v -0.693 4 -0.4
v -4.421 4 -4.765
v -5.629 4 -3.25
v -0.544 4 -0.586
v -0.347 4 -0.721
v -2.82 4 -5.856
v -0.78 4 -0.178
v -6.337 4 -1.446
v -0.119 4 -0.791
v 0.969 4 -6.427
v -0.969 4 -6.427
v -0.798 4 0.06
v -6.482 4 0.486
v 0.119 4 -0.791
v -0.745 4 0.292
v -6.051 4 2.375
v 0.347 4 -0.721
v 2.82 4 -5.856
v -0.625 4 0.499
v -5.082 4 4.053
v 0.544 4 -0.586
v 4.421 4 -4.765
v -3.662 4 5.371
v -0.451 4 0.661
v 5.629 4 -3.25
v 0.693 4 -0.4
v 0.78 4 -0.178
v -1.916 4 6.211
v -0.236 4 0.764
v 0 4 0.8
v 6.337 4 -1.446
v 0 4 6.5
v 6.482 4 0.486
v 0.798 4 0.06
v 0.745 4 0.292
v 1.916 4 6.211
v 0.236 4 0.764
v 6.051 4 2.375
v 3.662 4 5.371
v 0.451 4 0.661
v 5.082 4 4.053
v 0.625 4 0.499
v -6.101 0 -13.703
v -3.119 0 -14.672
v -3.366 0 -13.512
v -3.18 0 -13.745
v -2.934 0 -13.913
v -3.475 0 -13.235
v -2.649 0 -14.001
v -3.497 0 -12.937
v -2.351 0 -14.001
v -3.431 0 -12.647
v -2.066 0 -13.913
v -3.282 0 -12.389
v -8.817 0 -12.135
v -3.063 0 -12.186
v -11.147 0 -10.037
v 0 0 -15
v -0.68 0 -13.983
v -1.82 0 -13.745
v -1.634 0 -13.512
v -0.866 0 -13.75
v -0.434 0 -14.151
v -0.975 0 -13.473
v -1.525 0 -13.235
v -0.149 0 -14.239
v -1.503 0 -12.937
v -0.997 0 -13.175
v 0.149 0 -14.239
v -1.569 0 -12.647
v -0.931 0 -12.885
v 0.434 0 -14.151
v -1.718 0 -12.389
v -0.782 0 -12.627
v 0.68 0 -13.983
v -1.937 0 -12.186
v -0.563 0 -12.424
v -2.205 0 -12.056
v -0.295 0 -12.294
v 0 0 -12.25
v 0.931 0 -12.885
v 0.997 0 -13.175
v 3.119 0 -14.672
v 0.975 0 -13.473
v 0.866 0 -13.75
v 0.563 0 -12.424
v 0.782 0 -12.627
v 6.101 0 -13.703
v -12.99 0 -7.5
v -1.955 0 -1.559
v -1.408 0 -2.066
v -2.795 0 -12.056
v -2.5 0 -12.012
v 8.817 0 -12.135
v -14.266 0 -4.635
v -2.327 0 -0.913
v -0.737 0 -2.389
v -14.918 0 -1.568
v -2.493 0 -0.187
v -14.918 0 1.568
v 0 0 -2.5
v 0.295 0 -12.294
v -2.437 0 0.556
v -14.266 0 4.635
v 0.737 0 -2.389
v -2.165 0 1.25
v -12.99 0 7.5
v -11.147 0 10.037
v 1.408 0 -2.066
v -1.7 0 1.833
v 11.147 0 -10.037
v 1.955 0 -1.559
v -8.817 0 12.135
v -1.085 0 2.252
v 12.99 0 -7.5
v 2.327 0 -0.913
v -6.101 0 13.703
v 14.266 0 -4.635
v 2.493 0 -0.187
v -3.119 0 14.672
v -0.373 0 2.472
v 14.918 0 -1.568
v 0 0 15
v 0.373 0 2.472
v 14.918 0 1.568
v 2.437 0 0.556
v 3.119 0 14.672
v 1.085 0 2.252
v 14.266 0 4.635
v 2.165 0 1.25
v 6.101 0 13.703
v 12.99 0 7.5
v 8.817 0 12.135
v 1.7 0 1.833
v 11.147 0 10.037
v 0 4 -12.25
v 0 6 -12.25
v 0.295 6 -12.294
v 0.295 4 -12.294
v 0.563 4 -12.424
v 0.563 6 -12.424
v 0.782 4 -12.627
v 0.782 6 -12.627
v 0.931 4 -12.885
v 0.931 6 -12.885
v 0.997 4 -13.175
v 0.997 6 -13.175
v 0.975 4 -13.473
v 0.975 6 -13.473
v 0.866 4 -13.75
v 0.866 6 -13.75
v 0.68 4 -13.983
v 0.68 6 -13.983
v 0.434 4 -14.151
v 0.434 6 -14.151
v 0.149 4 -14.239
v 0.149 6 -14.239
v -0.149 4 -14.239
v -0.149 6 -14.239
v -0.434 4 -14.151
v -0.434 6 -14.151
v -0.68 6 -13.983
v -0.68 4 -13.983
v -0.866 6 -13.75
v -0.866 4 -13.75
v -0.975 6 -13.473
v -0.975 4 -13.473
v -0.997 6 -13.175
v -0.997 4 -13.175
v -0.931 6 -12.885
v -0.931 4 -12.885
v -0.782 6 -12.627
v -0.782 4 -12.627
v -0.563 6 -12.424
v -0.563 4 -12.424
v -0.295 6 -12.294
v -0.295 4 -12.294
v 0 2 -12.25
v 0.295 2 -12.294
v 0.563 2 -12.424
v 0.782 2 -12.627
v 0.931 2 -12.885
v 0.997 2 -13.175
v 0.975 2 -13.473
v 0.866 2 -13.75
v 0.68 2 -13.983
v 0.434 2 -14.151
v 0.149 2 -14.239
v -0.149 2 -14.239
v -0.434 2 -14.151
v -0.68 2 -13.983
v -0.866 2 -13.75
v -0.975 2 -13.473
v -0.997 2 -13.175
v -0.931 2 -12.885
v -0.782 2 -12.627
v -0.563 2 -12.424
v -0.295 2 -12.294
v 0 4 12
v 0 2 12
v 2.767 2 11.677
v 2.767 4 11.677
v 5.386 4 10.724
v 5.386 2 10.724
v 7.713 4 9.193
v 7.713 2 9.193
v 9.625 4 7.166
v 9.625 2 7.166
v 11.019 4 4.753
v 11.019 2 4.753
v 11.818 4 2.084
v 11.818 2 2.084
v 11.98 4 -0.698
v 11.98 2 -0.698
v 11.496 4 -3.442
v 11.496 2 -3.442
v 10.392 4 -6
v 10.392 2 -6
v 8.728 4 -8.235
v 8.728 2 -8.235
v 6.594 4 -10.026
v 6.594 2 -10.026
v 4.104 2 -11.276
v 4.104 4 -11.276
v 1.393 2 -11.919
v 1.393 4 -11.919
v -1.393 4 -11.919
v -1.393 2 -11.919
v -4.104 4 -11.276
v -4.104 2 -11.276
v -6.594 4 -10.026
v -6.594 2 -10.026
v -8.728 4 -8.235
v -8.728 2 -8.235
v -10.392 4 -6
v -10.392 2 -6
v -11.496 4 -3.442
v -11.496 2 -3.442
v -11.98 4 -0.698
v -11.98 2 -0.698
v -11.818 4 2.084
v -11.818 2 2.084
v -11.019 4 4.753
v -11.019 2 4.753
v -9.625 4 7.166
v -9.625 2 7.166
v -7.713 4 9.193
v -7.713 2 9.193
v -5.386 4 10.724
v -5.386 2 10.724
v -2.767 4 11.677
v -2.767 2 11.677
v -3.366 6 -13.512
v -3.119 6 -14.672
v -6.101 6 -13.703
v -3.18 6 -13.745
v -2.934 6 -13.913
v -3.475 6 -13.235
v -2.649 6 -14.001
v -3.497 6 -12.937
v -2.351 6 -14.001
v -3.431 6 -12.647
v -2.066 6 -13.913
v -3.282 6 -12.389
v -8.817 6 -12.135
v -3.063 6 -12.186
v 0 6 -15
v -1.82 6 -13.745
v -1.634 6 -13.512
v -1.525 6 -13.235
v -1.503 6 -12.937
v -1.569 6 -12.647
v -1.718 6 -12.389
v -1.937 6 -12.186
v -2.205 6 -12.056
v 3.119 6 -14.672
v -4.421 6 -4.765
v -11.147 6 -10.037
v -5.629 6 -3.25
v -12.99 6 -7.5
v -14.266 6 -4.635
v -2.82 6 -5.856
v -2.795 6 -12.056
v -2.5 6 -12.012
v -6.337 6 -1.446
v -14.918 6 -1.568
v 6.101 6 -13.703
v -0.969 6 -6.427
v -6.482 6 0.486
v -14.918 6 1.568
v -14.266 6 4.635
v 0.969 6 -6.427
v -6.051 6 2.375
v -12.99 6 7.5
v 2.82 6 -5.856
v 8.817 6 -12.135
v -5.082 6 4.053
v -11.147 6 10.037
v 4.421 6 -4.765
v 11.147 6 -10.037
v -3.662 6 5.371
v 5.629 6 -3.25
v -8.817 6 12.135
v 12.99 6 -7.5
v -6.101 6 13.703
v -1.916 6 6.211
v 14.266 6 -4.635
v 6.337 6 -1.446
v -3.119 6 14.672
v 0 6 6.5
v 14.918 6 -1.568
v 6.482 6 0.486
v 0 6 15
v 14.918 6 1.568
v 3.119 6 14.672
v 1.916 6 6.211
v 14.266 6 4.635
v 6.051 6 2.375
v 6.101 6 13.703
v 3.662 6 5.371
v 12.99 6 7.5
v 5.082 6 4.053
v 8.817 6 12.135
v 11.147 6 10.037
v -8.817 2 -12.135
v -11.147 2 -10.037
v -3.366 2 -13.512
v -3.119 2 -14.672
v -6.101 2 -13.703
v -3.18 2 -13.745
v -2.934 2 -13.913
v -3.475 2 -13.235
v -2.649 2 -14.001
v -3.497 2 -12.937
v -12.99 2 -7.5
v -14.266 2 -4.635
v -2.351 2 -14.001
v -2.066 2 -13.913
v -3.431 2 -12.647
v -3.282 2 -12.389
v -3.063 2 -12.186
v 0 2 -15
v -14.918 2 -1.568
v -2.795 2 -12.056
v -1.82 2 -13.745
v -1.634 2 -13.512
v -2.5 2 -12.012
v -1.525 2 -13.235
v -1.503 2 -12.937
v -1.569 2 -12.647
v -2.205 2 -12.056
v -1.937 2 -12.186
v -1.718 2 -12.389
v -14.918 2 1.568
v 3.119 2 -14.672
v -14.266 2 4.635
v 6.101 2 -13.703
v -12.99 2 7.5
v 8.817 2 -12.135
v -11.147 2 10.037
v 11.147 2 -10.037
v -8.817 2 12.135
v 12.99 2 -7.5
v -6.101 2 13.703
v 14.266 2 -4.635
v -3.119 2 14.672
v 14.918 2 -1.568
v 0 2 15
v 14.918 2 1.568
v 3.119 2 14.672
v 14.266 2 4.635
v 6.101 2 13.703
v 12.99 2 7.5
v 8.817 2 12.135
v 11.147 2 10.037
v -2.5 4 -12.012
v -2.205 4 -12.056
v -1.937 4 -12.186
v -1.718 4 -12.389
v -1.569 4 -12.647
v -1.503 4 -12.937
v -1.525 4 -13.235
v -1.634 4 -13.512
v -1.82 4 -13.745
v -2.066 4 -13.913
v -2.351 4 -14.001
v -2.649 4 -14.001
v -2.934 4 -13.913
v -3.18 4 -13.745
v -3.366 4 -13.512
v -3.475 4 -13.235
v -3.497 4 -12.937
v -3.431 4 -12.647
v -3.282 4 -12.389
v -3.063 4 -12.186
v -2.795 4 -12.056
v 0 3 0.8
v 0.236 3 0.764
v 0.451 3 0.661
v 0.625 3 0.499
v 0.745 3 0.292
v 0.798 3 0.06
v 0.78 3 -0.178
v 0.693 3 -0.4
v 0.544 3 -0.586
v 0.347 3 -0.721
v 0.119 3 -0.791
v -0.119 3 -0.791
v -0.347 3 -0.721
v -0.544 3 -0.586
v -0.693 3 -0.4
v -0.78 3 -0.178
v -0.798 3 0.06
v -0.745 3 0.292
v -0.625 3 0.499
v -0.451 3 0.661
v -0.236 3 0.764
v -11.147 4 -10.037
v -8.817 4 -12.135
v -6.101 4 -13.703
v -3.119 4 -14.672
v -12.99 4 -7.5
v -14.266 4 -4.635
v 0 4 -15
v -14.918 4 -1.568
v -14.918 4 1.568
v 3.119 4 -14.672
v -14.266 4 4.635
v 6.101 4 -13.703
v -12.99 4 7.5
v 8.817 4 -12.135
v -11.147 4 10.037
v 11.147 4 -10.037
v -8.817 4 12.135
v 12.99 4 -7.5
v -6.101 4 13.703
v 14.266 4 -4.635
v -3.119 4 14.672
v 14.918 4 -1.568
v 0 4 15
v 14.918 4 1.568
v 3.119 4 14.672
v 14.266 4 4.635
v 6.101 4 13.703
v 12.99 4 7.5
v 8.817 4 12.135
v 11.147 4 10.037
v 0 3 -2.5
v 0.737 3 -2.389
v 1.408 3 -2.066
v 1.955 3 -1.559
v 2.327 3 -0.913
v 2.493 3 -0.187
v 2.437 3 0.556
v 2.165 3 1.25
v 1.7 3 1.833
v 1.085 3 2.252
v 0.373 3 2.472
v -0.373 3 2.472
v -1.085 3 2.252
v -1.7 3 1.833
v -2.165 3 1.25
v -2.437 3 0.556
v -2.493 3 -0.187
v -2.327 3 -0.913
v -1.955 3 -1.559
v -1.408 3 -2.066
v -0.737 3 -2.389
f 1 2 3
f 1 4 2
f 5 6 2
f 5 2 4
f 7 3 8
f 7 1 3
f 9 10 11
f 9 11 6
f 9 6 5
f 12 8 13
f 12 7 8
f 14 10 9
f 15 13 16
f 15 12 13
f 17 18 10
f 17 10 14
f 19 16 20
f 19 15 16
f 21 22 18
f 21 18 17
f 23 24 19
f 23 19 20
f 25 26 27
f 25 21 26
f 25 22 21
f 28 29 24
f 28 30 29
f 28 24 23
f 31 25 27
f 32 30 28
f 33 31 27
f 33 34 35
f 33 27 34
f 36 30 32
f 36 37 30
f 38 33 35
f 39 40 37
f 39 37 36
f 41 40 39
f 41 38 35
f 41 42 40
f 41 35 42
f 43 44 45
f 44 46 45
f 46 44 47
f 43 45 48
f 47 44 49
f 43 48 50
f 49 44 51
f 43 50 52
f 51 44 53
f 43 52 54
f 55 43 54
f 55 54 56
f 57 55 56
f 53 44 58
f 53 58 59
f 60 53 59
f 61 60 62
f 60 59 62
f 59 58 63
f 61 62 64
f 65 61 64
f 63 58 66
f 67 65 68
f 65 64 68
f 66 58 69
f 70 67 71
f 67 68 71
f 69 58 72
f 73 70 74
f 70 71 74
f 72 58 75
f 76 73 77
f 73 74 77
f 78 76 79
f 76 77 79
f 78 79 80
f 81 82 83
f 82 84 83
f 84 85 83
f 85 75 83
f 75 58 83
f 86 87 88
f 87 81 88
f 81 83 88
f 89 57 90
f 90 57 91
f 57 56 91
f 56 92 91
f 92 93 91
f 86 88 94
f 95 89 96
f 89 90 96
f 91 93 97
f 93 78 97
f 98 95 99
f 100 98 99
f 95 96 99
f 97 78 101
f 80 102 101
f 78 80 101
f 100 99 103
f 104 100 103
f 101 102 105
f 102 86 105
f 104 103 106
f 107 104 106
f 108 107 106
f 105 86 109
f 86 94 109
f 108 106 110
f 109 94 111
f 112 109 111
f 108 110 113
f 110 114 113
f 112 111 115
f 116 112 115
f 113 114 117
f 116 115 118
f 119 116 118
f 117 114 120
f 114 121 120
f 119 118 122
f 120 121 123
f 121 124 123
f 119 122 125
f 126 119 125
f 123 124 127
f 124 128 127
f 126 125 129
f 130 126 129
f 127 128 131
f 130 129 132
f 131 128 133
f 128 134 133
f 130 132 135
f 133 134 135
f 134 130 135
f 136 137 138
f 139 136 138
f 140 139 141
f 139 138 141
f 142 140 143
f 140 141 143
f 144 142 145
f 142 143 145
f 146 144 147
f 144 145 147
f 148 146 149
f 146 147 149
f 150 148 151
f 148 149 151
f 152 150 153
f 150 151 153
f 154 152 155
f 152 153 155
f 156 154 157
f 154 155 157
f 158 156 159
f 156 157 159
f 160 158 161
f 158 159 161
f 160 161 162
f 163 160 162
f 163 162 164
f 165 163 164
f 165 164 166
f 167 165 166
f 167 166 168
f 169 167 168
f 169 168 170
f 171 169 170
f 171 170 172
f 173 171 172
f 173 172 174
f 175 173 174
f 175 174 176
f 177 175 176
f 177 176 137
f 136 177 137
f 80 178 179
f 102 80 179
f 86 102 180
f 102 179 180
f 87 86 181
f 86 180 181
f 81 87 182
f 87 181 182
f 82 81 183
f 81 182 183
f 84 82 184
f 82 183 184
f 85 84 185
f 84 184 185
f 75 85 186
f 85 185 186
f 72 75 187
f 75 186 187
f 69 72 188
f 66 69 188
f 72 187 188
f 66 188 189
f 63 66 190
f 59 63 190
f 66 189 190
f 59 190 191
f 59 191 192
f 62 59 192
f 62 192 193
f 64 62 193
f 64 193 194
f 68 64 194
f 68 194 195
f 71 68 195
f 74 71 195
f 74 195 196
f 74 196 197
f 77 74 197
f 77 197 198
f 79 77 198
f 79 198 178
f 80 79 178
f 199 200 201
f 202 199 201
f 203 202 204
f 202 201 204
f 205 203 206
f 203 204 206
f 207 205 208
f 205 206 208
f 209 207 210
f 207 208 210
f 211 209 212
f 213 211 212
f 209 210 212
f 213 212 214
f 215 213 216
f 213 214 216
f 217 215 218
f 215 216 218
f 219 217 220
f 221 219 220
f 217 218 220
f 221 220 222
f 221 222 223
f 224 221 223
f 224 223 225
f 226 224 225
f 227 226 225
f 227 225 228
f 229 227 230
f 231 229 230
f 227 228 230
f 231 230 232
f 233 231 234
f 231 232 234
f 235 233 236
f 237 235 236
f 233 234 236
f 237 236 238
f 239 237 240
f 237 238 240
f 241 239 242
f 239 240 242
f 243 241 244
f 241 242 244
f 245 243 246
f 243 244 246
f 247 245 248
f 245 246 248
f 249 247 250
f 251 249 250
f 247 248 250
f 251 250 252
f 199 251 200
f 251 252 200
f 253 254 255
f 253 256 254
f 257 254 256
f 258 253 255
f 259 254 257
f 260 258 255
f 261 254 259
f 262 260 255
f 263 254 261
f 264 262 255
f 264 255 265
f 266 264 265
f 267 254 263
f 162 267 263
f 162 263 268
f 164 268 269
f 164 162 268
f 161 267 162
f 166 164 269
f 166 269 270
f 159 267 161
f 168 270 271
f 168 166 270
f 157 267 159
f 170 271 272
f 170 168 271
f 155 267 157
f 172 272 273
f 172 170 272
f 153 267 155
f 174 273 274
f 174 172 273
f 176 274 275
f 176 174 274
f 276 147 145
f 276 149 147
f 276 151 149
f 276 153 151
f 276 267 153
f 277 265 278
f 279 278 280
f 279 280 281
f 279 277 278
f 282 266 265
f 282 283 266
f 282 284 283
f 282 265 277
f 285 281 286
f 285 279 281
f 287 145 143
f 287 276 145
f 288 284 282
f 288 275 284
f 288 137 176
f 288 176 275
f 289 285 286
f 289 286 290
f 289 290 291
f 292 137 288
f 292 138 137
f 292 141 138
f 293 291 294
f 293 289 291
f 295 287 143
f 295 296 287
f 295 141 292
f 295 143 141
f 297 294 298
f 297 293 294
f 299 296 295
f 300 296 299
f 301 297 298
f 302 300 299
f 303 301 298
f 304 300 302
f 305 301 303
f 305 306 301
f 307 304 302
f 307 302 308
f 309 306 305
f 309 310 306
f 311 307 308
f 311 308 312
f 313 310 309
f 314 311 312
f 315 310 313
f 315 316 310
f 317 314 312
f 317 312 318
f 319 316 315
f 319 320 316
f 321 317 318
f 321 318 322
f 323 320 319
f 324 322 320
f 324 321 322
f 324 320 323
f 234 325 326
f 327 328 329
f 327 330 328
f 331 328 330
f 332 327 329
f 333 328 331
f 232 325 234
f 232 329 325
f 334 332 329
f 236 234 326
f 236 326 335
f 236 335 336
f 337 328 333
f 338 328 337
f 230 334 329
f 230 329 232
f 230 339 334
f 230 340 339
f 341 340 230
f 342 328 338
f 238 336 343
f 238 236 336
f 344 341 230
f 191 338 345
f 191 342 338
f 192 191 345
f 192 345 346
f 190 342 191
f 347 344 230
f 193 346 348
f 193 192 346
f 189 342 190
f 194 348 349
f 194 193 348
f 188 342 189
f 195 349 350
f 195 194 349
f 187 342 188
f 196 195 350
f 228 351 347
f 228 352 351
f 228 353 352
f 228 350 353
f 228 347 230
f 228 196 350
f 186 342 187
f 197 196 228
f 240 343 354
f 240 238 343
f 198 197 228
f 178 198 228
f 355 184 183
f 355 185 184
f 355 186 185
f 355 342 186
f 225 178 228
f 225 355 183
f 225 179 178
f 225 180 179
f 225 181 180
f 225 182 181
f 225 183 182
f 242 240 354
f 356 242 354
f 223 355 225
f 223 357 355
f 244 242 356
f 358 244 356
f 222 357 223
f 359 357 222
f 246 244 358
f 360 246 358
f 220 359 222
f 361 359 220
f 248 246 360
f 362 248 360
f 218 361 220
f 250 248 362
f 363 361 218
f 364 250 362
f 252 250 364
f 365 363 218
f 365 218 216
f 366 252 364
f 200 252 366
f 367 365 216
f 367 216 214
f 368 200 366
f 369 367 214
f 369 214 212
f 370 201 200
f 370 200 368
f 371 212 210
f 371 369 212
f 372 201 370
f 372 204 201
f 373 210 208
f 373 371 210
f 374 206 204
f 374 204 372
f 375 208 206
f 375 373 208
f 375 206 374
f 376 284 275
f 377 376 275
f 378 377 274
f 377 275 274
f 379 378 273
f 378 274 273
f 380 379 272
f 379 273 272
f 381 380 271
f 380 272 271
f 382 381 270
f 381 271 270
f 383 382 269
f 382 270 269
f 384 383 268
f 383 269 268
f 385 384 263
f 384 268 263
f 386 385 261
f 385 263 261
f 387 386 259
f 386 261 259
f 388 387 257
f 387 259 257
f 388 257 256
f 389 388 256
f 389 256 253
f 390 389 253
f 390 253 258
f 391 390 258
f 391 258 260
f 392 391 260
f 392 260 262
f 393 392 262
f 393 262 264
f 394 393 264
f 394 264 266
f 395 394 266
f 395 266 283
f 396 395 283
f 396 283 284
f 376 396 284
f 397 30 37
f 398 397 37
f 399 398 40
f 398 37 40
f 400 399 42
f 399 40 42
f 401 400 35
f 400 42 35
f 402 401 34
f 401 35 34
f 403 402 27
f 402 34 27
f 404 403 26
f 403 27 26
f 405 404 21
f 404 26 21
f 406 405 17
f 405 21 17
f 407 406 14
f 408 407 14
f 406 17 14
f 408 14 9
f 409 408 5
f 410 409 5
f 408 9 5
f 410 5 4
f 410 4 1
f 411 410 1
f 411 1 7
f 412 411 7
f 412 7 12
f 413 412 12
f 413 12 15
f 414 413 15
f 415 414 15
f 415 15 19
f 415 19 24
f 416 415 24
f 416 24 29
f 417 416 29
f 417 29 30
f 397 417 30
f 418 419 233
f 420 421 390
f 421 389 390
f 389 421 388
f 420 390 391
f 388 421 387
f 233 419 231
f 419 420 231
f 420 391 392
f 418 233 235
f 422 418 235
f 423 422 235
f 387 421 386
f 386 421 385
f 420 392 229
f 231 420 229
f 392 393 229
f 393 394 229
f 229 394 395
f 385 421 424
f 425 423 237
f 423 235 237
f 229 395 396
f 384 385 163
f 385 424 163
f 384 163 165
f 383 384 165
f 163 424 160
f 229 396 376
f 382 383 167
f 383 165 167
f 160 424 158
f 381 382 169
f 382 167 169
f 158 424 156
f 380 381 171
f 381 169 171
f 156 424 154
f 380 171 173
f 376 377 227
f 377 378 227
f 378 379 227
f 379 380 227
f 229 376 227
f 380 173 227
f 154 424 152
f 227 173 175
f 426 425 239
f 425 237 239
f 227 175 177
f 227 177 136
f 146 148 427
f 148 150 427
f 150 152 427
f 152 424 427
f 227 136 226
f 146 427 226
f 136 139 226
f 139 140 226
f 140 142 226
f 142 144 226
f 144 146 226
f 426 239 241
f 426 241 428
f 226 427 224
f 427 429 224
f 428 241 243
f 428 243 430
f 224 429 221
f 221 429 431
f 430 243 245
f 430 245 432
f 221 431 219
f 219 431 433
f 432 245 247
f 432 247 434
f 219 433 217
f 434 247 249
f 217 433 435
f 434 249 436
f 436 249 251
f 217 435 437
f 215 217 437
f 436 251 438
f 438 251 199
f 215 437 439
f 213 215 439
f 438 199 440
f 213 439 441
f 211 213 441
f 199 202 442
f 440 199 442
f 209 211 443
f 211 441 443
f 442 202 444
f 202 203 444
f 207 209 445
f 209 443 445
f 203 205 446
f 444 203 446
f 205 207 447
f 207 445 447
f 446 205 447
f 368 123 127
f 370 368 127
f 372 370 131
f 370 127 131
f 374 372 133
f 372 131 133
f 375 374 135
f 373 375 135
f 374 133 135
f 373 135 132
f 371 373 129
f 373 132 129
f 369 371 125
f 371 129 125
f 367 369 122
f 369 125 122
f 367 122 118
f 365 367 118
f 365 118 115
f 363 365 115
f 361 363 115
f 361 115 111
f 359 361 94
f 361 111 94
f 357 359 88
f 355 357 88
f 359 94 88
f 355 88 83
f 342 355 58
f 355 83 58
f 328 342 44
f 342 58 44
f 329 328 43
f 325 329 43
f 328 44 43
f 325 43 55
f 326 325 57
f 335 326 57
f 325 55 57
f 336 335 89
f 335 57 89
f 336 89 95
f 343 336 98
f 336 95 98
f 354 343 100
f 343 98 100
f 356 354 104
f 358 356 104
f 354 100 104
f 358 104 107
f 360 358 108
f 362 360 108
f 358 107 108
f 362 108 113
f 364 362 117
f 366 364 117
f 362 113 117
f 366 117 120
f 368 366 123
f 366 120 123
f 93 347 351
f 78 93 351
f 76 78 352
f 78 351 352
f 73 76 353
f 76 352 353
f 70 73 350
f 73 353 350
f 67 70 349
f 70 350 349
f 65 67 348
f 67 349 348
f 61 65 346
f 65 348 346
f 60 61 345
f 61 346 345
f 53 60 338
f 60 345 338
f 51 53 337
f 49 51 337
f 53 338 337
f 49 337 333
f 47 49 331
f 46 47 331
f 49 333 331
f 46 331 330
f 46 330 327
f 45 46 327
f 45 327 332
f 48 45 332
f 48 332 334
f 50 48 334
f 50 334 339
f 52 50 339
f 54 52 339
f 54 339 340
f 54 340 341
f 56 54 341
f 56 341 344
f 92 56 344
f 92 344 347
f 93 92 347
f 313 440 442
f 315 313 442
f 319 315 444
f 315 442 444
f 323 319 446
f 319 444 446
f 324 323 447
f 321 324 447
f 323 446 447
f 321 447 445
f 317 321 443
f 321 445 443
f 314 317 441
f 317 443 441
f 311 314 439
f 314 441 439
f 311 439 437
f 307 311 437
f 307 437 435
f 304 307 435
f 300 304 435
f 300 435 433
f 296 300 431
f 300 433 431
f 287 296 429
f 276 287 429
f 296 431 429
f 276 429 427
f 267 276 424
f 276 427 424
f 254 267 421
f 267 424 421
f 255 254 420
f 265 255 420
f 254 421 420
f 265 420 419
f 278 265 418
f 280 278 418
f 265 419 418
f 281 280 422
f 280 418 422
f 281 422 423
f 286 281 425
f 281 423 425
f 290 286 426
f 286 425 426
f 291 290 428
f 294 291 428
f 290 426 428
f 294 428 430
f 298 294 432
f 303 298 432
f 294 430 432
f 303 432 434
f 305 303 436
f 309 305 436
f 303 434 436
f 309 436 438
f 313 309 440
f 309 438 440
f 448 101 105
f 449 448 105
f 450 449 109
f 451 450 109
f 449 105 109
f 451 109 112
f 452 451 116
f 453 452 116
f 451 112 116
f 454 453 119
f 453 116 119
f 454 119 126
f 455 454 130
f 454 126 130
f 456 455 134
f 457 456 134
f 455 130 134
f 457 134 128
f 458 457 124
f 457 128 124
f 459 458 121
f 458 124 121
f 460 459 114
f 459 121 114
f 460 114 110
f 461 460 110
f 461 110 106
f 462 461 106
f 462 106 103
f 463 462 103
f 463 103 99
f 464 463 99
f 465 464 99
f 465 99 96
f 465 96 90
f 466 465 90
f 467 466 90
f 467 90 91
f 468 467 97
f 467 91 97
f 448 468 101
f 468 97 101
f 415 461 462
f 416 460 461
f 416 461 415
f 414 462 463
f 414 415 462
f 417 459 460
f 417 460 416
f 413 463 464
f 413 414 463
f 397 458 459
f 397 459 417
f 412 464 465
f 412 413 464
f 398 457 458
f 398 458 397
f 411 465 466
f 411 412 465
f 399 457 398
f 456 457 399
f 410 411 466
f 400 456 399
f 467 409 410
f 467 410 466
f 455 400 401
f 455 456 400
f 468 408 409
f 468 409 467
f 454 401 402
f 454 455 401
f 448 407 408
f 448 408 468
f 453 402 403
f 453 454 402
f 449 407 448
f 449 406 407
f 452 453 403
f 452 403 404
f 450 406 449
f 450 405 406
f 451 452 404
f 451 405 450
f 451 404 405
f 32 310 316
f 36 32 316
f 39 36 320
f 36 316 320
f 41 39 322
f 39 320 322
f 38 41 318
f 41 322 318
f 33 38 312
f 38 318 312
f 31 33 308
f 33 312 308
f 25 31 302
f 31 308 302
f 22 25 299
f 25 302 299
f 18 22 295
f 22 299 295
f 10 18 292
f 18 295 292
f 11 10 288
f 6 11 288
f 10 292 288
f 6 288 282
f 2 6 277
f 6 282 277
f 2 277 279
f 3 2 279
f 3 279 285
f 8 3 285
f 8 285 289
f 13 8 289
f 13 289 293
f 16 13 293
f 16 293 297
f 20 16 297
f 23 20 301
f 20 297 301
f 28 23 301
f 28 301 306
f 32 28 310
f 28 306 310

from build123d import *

# Parameters (mm, degrees)
SKETCH1_R           = 15
BOSS_EXTRUDE1_DEPTH = 2
SKETCH2_R           = 12
BOSS_EXTRUDE2_DEPTH = 2
SKETCH3_R           = 15
BOSS_EXTRUDE3_DEPTH = 2
SKETCH6_R           = 2.5
CUT_EXTRUDE5_DEPTH  = 3
SKETCH4_R           = 6.5
CUT_EXTRUDE6_DEPTH  = 2
SKETCH10_R          = 0.8
CUT_EXTRUDE7_DEPTH  = 22.587033145
SKETCH11_R          = 1
CUT_EXTRUDE8_DEPTH  = 23.045407685


with BuildPart() as part:
    # Sketch1 → Boss-Extrude1 (new body)
    with BuildSketch(Plane(origin=(0, 0, 0), x_dir=(1, 0, 0), z_dir=(0, 1, 0))):
        with Locations(Location((0, 0, 0), (0, 0, 270))):
            Circle(SKETCH1_R)
    extrude(amount=BOSS_EXTRUDE1_DEPTH)

    # Sketch2 → Boss-Extrude2 (add)
    with BuildSketch(Plane(origin=(0, 2, 0), x_dir=(1, 0, 0), z_dir=(0, 1, 0))):
        with Locations(Location((0, 0, 0), (0, 0, 270))):
            Circle(SKETCH2_R)
    extrude(amount=BOSS_EXTRUDE2_DEPTH)

    # Sketch3 → Boss-Extrude3 (add)
    with BuildSketch(Plane(origin=(0, 4, 0), x_dir=(1, 0, 0), z_dir=(0, 1, 0))):
        with Locations(Location((0, 0, 0), (0, 0, 270))):
            Circle(SKETCH3_R)
    extrude(amount=BOSS_EXTRUDE3_DEPTH)

    # Sketch6 → Cut-Extrude5 (cut)
    with BuildSketch(Plane.XZ):
        with Locations(Location((0, 0, 0), (0, 0, 270))):
            Circle(SKETCH6_R)
    extrude(amount=-CUT_EXTRUDE5_DEPTH, mode=Mode.SUBTRACT)

    # Sketch4 → Cut-Extrude6 (cut)
    with BuildSketch(Plane(origin=(0, 6, 0), x_dir=(1, 0, 0), z_dir=(0, 1, 0))):
        with Locations(Location((0, 0, 0), (0, 0, 270))):
            Circle(SKETCH4_R)
    extrude(amount=-CUT_EXTRUDE6_DEPTH, mode=Mode.SUBTRACT)

    # Sketch10 → Cut-Extrude7 (cut, through all)
    with BuildSketch(Plane(origin=(0, 4, 0), x_dir=(1, 0, 0), z_dir=(0, 1, 0))):
        with Locations(Location((0, 0, 0), (0, 0, 270))):
            Circle(SKETCH10_R)
    extrude(amount=-CUT_EXTRUDE7_DEPTH, mode=Mode.SUBTRACT)

    # Sketch11 → Cut-Extrude8 (cut, through all)
    with BuildSketch(Plane(origin=(0, 6, 0), x_dir=(1, 0, 0), z_dir=(0, 1, 0))):
        with Locations(Location((0, 13.25, 0), (0, 0, 270))):
            Circle(SKETCH11_R)
        with Locations(Location((-2.5, 13.01201368, 0), (0, 0, 270))):
            Circle(SKETCH11_R)
    extrude(amount=-CUT_EXTRUDE8_DEPTH, mode=Mode.SUBTRACT)


solid = part.part
